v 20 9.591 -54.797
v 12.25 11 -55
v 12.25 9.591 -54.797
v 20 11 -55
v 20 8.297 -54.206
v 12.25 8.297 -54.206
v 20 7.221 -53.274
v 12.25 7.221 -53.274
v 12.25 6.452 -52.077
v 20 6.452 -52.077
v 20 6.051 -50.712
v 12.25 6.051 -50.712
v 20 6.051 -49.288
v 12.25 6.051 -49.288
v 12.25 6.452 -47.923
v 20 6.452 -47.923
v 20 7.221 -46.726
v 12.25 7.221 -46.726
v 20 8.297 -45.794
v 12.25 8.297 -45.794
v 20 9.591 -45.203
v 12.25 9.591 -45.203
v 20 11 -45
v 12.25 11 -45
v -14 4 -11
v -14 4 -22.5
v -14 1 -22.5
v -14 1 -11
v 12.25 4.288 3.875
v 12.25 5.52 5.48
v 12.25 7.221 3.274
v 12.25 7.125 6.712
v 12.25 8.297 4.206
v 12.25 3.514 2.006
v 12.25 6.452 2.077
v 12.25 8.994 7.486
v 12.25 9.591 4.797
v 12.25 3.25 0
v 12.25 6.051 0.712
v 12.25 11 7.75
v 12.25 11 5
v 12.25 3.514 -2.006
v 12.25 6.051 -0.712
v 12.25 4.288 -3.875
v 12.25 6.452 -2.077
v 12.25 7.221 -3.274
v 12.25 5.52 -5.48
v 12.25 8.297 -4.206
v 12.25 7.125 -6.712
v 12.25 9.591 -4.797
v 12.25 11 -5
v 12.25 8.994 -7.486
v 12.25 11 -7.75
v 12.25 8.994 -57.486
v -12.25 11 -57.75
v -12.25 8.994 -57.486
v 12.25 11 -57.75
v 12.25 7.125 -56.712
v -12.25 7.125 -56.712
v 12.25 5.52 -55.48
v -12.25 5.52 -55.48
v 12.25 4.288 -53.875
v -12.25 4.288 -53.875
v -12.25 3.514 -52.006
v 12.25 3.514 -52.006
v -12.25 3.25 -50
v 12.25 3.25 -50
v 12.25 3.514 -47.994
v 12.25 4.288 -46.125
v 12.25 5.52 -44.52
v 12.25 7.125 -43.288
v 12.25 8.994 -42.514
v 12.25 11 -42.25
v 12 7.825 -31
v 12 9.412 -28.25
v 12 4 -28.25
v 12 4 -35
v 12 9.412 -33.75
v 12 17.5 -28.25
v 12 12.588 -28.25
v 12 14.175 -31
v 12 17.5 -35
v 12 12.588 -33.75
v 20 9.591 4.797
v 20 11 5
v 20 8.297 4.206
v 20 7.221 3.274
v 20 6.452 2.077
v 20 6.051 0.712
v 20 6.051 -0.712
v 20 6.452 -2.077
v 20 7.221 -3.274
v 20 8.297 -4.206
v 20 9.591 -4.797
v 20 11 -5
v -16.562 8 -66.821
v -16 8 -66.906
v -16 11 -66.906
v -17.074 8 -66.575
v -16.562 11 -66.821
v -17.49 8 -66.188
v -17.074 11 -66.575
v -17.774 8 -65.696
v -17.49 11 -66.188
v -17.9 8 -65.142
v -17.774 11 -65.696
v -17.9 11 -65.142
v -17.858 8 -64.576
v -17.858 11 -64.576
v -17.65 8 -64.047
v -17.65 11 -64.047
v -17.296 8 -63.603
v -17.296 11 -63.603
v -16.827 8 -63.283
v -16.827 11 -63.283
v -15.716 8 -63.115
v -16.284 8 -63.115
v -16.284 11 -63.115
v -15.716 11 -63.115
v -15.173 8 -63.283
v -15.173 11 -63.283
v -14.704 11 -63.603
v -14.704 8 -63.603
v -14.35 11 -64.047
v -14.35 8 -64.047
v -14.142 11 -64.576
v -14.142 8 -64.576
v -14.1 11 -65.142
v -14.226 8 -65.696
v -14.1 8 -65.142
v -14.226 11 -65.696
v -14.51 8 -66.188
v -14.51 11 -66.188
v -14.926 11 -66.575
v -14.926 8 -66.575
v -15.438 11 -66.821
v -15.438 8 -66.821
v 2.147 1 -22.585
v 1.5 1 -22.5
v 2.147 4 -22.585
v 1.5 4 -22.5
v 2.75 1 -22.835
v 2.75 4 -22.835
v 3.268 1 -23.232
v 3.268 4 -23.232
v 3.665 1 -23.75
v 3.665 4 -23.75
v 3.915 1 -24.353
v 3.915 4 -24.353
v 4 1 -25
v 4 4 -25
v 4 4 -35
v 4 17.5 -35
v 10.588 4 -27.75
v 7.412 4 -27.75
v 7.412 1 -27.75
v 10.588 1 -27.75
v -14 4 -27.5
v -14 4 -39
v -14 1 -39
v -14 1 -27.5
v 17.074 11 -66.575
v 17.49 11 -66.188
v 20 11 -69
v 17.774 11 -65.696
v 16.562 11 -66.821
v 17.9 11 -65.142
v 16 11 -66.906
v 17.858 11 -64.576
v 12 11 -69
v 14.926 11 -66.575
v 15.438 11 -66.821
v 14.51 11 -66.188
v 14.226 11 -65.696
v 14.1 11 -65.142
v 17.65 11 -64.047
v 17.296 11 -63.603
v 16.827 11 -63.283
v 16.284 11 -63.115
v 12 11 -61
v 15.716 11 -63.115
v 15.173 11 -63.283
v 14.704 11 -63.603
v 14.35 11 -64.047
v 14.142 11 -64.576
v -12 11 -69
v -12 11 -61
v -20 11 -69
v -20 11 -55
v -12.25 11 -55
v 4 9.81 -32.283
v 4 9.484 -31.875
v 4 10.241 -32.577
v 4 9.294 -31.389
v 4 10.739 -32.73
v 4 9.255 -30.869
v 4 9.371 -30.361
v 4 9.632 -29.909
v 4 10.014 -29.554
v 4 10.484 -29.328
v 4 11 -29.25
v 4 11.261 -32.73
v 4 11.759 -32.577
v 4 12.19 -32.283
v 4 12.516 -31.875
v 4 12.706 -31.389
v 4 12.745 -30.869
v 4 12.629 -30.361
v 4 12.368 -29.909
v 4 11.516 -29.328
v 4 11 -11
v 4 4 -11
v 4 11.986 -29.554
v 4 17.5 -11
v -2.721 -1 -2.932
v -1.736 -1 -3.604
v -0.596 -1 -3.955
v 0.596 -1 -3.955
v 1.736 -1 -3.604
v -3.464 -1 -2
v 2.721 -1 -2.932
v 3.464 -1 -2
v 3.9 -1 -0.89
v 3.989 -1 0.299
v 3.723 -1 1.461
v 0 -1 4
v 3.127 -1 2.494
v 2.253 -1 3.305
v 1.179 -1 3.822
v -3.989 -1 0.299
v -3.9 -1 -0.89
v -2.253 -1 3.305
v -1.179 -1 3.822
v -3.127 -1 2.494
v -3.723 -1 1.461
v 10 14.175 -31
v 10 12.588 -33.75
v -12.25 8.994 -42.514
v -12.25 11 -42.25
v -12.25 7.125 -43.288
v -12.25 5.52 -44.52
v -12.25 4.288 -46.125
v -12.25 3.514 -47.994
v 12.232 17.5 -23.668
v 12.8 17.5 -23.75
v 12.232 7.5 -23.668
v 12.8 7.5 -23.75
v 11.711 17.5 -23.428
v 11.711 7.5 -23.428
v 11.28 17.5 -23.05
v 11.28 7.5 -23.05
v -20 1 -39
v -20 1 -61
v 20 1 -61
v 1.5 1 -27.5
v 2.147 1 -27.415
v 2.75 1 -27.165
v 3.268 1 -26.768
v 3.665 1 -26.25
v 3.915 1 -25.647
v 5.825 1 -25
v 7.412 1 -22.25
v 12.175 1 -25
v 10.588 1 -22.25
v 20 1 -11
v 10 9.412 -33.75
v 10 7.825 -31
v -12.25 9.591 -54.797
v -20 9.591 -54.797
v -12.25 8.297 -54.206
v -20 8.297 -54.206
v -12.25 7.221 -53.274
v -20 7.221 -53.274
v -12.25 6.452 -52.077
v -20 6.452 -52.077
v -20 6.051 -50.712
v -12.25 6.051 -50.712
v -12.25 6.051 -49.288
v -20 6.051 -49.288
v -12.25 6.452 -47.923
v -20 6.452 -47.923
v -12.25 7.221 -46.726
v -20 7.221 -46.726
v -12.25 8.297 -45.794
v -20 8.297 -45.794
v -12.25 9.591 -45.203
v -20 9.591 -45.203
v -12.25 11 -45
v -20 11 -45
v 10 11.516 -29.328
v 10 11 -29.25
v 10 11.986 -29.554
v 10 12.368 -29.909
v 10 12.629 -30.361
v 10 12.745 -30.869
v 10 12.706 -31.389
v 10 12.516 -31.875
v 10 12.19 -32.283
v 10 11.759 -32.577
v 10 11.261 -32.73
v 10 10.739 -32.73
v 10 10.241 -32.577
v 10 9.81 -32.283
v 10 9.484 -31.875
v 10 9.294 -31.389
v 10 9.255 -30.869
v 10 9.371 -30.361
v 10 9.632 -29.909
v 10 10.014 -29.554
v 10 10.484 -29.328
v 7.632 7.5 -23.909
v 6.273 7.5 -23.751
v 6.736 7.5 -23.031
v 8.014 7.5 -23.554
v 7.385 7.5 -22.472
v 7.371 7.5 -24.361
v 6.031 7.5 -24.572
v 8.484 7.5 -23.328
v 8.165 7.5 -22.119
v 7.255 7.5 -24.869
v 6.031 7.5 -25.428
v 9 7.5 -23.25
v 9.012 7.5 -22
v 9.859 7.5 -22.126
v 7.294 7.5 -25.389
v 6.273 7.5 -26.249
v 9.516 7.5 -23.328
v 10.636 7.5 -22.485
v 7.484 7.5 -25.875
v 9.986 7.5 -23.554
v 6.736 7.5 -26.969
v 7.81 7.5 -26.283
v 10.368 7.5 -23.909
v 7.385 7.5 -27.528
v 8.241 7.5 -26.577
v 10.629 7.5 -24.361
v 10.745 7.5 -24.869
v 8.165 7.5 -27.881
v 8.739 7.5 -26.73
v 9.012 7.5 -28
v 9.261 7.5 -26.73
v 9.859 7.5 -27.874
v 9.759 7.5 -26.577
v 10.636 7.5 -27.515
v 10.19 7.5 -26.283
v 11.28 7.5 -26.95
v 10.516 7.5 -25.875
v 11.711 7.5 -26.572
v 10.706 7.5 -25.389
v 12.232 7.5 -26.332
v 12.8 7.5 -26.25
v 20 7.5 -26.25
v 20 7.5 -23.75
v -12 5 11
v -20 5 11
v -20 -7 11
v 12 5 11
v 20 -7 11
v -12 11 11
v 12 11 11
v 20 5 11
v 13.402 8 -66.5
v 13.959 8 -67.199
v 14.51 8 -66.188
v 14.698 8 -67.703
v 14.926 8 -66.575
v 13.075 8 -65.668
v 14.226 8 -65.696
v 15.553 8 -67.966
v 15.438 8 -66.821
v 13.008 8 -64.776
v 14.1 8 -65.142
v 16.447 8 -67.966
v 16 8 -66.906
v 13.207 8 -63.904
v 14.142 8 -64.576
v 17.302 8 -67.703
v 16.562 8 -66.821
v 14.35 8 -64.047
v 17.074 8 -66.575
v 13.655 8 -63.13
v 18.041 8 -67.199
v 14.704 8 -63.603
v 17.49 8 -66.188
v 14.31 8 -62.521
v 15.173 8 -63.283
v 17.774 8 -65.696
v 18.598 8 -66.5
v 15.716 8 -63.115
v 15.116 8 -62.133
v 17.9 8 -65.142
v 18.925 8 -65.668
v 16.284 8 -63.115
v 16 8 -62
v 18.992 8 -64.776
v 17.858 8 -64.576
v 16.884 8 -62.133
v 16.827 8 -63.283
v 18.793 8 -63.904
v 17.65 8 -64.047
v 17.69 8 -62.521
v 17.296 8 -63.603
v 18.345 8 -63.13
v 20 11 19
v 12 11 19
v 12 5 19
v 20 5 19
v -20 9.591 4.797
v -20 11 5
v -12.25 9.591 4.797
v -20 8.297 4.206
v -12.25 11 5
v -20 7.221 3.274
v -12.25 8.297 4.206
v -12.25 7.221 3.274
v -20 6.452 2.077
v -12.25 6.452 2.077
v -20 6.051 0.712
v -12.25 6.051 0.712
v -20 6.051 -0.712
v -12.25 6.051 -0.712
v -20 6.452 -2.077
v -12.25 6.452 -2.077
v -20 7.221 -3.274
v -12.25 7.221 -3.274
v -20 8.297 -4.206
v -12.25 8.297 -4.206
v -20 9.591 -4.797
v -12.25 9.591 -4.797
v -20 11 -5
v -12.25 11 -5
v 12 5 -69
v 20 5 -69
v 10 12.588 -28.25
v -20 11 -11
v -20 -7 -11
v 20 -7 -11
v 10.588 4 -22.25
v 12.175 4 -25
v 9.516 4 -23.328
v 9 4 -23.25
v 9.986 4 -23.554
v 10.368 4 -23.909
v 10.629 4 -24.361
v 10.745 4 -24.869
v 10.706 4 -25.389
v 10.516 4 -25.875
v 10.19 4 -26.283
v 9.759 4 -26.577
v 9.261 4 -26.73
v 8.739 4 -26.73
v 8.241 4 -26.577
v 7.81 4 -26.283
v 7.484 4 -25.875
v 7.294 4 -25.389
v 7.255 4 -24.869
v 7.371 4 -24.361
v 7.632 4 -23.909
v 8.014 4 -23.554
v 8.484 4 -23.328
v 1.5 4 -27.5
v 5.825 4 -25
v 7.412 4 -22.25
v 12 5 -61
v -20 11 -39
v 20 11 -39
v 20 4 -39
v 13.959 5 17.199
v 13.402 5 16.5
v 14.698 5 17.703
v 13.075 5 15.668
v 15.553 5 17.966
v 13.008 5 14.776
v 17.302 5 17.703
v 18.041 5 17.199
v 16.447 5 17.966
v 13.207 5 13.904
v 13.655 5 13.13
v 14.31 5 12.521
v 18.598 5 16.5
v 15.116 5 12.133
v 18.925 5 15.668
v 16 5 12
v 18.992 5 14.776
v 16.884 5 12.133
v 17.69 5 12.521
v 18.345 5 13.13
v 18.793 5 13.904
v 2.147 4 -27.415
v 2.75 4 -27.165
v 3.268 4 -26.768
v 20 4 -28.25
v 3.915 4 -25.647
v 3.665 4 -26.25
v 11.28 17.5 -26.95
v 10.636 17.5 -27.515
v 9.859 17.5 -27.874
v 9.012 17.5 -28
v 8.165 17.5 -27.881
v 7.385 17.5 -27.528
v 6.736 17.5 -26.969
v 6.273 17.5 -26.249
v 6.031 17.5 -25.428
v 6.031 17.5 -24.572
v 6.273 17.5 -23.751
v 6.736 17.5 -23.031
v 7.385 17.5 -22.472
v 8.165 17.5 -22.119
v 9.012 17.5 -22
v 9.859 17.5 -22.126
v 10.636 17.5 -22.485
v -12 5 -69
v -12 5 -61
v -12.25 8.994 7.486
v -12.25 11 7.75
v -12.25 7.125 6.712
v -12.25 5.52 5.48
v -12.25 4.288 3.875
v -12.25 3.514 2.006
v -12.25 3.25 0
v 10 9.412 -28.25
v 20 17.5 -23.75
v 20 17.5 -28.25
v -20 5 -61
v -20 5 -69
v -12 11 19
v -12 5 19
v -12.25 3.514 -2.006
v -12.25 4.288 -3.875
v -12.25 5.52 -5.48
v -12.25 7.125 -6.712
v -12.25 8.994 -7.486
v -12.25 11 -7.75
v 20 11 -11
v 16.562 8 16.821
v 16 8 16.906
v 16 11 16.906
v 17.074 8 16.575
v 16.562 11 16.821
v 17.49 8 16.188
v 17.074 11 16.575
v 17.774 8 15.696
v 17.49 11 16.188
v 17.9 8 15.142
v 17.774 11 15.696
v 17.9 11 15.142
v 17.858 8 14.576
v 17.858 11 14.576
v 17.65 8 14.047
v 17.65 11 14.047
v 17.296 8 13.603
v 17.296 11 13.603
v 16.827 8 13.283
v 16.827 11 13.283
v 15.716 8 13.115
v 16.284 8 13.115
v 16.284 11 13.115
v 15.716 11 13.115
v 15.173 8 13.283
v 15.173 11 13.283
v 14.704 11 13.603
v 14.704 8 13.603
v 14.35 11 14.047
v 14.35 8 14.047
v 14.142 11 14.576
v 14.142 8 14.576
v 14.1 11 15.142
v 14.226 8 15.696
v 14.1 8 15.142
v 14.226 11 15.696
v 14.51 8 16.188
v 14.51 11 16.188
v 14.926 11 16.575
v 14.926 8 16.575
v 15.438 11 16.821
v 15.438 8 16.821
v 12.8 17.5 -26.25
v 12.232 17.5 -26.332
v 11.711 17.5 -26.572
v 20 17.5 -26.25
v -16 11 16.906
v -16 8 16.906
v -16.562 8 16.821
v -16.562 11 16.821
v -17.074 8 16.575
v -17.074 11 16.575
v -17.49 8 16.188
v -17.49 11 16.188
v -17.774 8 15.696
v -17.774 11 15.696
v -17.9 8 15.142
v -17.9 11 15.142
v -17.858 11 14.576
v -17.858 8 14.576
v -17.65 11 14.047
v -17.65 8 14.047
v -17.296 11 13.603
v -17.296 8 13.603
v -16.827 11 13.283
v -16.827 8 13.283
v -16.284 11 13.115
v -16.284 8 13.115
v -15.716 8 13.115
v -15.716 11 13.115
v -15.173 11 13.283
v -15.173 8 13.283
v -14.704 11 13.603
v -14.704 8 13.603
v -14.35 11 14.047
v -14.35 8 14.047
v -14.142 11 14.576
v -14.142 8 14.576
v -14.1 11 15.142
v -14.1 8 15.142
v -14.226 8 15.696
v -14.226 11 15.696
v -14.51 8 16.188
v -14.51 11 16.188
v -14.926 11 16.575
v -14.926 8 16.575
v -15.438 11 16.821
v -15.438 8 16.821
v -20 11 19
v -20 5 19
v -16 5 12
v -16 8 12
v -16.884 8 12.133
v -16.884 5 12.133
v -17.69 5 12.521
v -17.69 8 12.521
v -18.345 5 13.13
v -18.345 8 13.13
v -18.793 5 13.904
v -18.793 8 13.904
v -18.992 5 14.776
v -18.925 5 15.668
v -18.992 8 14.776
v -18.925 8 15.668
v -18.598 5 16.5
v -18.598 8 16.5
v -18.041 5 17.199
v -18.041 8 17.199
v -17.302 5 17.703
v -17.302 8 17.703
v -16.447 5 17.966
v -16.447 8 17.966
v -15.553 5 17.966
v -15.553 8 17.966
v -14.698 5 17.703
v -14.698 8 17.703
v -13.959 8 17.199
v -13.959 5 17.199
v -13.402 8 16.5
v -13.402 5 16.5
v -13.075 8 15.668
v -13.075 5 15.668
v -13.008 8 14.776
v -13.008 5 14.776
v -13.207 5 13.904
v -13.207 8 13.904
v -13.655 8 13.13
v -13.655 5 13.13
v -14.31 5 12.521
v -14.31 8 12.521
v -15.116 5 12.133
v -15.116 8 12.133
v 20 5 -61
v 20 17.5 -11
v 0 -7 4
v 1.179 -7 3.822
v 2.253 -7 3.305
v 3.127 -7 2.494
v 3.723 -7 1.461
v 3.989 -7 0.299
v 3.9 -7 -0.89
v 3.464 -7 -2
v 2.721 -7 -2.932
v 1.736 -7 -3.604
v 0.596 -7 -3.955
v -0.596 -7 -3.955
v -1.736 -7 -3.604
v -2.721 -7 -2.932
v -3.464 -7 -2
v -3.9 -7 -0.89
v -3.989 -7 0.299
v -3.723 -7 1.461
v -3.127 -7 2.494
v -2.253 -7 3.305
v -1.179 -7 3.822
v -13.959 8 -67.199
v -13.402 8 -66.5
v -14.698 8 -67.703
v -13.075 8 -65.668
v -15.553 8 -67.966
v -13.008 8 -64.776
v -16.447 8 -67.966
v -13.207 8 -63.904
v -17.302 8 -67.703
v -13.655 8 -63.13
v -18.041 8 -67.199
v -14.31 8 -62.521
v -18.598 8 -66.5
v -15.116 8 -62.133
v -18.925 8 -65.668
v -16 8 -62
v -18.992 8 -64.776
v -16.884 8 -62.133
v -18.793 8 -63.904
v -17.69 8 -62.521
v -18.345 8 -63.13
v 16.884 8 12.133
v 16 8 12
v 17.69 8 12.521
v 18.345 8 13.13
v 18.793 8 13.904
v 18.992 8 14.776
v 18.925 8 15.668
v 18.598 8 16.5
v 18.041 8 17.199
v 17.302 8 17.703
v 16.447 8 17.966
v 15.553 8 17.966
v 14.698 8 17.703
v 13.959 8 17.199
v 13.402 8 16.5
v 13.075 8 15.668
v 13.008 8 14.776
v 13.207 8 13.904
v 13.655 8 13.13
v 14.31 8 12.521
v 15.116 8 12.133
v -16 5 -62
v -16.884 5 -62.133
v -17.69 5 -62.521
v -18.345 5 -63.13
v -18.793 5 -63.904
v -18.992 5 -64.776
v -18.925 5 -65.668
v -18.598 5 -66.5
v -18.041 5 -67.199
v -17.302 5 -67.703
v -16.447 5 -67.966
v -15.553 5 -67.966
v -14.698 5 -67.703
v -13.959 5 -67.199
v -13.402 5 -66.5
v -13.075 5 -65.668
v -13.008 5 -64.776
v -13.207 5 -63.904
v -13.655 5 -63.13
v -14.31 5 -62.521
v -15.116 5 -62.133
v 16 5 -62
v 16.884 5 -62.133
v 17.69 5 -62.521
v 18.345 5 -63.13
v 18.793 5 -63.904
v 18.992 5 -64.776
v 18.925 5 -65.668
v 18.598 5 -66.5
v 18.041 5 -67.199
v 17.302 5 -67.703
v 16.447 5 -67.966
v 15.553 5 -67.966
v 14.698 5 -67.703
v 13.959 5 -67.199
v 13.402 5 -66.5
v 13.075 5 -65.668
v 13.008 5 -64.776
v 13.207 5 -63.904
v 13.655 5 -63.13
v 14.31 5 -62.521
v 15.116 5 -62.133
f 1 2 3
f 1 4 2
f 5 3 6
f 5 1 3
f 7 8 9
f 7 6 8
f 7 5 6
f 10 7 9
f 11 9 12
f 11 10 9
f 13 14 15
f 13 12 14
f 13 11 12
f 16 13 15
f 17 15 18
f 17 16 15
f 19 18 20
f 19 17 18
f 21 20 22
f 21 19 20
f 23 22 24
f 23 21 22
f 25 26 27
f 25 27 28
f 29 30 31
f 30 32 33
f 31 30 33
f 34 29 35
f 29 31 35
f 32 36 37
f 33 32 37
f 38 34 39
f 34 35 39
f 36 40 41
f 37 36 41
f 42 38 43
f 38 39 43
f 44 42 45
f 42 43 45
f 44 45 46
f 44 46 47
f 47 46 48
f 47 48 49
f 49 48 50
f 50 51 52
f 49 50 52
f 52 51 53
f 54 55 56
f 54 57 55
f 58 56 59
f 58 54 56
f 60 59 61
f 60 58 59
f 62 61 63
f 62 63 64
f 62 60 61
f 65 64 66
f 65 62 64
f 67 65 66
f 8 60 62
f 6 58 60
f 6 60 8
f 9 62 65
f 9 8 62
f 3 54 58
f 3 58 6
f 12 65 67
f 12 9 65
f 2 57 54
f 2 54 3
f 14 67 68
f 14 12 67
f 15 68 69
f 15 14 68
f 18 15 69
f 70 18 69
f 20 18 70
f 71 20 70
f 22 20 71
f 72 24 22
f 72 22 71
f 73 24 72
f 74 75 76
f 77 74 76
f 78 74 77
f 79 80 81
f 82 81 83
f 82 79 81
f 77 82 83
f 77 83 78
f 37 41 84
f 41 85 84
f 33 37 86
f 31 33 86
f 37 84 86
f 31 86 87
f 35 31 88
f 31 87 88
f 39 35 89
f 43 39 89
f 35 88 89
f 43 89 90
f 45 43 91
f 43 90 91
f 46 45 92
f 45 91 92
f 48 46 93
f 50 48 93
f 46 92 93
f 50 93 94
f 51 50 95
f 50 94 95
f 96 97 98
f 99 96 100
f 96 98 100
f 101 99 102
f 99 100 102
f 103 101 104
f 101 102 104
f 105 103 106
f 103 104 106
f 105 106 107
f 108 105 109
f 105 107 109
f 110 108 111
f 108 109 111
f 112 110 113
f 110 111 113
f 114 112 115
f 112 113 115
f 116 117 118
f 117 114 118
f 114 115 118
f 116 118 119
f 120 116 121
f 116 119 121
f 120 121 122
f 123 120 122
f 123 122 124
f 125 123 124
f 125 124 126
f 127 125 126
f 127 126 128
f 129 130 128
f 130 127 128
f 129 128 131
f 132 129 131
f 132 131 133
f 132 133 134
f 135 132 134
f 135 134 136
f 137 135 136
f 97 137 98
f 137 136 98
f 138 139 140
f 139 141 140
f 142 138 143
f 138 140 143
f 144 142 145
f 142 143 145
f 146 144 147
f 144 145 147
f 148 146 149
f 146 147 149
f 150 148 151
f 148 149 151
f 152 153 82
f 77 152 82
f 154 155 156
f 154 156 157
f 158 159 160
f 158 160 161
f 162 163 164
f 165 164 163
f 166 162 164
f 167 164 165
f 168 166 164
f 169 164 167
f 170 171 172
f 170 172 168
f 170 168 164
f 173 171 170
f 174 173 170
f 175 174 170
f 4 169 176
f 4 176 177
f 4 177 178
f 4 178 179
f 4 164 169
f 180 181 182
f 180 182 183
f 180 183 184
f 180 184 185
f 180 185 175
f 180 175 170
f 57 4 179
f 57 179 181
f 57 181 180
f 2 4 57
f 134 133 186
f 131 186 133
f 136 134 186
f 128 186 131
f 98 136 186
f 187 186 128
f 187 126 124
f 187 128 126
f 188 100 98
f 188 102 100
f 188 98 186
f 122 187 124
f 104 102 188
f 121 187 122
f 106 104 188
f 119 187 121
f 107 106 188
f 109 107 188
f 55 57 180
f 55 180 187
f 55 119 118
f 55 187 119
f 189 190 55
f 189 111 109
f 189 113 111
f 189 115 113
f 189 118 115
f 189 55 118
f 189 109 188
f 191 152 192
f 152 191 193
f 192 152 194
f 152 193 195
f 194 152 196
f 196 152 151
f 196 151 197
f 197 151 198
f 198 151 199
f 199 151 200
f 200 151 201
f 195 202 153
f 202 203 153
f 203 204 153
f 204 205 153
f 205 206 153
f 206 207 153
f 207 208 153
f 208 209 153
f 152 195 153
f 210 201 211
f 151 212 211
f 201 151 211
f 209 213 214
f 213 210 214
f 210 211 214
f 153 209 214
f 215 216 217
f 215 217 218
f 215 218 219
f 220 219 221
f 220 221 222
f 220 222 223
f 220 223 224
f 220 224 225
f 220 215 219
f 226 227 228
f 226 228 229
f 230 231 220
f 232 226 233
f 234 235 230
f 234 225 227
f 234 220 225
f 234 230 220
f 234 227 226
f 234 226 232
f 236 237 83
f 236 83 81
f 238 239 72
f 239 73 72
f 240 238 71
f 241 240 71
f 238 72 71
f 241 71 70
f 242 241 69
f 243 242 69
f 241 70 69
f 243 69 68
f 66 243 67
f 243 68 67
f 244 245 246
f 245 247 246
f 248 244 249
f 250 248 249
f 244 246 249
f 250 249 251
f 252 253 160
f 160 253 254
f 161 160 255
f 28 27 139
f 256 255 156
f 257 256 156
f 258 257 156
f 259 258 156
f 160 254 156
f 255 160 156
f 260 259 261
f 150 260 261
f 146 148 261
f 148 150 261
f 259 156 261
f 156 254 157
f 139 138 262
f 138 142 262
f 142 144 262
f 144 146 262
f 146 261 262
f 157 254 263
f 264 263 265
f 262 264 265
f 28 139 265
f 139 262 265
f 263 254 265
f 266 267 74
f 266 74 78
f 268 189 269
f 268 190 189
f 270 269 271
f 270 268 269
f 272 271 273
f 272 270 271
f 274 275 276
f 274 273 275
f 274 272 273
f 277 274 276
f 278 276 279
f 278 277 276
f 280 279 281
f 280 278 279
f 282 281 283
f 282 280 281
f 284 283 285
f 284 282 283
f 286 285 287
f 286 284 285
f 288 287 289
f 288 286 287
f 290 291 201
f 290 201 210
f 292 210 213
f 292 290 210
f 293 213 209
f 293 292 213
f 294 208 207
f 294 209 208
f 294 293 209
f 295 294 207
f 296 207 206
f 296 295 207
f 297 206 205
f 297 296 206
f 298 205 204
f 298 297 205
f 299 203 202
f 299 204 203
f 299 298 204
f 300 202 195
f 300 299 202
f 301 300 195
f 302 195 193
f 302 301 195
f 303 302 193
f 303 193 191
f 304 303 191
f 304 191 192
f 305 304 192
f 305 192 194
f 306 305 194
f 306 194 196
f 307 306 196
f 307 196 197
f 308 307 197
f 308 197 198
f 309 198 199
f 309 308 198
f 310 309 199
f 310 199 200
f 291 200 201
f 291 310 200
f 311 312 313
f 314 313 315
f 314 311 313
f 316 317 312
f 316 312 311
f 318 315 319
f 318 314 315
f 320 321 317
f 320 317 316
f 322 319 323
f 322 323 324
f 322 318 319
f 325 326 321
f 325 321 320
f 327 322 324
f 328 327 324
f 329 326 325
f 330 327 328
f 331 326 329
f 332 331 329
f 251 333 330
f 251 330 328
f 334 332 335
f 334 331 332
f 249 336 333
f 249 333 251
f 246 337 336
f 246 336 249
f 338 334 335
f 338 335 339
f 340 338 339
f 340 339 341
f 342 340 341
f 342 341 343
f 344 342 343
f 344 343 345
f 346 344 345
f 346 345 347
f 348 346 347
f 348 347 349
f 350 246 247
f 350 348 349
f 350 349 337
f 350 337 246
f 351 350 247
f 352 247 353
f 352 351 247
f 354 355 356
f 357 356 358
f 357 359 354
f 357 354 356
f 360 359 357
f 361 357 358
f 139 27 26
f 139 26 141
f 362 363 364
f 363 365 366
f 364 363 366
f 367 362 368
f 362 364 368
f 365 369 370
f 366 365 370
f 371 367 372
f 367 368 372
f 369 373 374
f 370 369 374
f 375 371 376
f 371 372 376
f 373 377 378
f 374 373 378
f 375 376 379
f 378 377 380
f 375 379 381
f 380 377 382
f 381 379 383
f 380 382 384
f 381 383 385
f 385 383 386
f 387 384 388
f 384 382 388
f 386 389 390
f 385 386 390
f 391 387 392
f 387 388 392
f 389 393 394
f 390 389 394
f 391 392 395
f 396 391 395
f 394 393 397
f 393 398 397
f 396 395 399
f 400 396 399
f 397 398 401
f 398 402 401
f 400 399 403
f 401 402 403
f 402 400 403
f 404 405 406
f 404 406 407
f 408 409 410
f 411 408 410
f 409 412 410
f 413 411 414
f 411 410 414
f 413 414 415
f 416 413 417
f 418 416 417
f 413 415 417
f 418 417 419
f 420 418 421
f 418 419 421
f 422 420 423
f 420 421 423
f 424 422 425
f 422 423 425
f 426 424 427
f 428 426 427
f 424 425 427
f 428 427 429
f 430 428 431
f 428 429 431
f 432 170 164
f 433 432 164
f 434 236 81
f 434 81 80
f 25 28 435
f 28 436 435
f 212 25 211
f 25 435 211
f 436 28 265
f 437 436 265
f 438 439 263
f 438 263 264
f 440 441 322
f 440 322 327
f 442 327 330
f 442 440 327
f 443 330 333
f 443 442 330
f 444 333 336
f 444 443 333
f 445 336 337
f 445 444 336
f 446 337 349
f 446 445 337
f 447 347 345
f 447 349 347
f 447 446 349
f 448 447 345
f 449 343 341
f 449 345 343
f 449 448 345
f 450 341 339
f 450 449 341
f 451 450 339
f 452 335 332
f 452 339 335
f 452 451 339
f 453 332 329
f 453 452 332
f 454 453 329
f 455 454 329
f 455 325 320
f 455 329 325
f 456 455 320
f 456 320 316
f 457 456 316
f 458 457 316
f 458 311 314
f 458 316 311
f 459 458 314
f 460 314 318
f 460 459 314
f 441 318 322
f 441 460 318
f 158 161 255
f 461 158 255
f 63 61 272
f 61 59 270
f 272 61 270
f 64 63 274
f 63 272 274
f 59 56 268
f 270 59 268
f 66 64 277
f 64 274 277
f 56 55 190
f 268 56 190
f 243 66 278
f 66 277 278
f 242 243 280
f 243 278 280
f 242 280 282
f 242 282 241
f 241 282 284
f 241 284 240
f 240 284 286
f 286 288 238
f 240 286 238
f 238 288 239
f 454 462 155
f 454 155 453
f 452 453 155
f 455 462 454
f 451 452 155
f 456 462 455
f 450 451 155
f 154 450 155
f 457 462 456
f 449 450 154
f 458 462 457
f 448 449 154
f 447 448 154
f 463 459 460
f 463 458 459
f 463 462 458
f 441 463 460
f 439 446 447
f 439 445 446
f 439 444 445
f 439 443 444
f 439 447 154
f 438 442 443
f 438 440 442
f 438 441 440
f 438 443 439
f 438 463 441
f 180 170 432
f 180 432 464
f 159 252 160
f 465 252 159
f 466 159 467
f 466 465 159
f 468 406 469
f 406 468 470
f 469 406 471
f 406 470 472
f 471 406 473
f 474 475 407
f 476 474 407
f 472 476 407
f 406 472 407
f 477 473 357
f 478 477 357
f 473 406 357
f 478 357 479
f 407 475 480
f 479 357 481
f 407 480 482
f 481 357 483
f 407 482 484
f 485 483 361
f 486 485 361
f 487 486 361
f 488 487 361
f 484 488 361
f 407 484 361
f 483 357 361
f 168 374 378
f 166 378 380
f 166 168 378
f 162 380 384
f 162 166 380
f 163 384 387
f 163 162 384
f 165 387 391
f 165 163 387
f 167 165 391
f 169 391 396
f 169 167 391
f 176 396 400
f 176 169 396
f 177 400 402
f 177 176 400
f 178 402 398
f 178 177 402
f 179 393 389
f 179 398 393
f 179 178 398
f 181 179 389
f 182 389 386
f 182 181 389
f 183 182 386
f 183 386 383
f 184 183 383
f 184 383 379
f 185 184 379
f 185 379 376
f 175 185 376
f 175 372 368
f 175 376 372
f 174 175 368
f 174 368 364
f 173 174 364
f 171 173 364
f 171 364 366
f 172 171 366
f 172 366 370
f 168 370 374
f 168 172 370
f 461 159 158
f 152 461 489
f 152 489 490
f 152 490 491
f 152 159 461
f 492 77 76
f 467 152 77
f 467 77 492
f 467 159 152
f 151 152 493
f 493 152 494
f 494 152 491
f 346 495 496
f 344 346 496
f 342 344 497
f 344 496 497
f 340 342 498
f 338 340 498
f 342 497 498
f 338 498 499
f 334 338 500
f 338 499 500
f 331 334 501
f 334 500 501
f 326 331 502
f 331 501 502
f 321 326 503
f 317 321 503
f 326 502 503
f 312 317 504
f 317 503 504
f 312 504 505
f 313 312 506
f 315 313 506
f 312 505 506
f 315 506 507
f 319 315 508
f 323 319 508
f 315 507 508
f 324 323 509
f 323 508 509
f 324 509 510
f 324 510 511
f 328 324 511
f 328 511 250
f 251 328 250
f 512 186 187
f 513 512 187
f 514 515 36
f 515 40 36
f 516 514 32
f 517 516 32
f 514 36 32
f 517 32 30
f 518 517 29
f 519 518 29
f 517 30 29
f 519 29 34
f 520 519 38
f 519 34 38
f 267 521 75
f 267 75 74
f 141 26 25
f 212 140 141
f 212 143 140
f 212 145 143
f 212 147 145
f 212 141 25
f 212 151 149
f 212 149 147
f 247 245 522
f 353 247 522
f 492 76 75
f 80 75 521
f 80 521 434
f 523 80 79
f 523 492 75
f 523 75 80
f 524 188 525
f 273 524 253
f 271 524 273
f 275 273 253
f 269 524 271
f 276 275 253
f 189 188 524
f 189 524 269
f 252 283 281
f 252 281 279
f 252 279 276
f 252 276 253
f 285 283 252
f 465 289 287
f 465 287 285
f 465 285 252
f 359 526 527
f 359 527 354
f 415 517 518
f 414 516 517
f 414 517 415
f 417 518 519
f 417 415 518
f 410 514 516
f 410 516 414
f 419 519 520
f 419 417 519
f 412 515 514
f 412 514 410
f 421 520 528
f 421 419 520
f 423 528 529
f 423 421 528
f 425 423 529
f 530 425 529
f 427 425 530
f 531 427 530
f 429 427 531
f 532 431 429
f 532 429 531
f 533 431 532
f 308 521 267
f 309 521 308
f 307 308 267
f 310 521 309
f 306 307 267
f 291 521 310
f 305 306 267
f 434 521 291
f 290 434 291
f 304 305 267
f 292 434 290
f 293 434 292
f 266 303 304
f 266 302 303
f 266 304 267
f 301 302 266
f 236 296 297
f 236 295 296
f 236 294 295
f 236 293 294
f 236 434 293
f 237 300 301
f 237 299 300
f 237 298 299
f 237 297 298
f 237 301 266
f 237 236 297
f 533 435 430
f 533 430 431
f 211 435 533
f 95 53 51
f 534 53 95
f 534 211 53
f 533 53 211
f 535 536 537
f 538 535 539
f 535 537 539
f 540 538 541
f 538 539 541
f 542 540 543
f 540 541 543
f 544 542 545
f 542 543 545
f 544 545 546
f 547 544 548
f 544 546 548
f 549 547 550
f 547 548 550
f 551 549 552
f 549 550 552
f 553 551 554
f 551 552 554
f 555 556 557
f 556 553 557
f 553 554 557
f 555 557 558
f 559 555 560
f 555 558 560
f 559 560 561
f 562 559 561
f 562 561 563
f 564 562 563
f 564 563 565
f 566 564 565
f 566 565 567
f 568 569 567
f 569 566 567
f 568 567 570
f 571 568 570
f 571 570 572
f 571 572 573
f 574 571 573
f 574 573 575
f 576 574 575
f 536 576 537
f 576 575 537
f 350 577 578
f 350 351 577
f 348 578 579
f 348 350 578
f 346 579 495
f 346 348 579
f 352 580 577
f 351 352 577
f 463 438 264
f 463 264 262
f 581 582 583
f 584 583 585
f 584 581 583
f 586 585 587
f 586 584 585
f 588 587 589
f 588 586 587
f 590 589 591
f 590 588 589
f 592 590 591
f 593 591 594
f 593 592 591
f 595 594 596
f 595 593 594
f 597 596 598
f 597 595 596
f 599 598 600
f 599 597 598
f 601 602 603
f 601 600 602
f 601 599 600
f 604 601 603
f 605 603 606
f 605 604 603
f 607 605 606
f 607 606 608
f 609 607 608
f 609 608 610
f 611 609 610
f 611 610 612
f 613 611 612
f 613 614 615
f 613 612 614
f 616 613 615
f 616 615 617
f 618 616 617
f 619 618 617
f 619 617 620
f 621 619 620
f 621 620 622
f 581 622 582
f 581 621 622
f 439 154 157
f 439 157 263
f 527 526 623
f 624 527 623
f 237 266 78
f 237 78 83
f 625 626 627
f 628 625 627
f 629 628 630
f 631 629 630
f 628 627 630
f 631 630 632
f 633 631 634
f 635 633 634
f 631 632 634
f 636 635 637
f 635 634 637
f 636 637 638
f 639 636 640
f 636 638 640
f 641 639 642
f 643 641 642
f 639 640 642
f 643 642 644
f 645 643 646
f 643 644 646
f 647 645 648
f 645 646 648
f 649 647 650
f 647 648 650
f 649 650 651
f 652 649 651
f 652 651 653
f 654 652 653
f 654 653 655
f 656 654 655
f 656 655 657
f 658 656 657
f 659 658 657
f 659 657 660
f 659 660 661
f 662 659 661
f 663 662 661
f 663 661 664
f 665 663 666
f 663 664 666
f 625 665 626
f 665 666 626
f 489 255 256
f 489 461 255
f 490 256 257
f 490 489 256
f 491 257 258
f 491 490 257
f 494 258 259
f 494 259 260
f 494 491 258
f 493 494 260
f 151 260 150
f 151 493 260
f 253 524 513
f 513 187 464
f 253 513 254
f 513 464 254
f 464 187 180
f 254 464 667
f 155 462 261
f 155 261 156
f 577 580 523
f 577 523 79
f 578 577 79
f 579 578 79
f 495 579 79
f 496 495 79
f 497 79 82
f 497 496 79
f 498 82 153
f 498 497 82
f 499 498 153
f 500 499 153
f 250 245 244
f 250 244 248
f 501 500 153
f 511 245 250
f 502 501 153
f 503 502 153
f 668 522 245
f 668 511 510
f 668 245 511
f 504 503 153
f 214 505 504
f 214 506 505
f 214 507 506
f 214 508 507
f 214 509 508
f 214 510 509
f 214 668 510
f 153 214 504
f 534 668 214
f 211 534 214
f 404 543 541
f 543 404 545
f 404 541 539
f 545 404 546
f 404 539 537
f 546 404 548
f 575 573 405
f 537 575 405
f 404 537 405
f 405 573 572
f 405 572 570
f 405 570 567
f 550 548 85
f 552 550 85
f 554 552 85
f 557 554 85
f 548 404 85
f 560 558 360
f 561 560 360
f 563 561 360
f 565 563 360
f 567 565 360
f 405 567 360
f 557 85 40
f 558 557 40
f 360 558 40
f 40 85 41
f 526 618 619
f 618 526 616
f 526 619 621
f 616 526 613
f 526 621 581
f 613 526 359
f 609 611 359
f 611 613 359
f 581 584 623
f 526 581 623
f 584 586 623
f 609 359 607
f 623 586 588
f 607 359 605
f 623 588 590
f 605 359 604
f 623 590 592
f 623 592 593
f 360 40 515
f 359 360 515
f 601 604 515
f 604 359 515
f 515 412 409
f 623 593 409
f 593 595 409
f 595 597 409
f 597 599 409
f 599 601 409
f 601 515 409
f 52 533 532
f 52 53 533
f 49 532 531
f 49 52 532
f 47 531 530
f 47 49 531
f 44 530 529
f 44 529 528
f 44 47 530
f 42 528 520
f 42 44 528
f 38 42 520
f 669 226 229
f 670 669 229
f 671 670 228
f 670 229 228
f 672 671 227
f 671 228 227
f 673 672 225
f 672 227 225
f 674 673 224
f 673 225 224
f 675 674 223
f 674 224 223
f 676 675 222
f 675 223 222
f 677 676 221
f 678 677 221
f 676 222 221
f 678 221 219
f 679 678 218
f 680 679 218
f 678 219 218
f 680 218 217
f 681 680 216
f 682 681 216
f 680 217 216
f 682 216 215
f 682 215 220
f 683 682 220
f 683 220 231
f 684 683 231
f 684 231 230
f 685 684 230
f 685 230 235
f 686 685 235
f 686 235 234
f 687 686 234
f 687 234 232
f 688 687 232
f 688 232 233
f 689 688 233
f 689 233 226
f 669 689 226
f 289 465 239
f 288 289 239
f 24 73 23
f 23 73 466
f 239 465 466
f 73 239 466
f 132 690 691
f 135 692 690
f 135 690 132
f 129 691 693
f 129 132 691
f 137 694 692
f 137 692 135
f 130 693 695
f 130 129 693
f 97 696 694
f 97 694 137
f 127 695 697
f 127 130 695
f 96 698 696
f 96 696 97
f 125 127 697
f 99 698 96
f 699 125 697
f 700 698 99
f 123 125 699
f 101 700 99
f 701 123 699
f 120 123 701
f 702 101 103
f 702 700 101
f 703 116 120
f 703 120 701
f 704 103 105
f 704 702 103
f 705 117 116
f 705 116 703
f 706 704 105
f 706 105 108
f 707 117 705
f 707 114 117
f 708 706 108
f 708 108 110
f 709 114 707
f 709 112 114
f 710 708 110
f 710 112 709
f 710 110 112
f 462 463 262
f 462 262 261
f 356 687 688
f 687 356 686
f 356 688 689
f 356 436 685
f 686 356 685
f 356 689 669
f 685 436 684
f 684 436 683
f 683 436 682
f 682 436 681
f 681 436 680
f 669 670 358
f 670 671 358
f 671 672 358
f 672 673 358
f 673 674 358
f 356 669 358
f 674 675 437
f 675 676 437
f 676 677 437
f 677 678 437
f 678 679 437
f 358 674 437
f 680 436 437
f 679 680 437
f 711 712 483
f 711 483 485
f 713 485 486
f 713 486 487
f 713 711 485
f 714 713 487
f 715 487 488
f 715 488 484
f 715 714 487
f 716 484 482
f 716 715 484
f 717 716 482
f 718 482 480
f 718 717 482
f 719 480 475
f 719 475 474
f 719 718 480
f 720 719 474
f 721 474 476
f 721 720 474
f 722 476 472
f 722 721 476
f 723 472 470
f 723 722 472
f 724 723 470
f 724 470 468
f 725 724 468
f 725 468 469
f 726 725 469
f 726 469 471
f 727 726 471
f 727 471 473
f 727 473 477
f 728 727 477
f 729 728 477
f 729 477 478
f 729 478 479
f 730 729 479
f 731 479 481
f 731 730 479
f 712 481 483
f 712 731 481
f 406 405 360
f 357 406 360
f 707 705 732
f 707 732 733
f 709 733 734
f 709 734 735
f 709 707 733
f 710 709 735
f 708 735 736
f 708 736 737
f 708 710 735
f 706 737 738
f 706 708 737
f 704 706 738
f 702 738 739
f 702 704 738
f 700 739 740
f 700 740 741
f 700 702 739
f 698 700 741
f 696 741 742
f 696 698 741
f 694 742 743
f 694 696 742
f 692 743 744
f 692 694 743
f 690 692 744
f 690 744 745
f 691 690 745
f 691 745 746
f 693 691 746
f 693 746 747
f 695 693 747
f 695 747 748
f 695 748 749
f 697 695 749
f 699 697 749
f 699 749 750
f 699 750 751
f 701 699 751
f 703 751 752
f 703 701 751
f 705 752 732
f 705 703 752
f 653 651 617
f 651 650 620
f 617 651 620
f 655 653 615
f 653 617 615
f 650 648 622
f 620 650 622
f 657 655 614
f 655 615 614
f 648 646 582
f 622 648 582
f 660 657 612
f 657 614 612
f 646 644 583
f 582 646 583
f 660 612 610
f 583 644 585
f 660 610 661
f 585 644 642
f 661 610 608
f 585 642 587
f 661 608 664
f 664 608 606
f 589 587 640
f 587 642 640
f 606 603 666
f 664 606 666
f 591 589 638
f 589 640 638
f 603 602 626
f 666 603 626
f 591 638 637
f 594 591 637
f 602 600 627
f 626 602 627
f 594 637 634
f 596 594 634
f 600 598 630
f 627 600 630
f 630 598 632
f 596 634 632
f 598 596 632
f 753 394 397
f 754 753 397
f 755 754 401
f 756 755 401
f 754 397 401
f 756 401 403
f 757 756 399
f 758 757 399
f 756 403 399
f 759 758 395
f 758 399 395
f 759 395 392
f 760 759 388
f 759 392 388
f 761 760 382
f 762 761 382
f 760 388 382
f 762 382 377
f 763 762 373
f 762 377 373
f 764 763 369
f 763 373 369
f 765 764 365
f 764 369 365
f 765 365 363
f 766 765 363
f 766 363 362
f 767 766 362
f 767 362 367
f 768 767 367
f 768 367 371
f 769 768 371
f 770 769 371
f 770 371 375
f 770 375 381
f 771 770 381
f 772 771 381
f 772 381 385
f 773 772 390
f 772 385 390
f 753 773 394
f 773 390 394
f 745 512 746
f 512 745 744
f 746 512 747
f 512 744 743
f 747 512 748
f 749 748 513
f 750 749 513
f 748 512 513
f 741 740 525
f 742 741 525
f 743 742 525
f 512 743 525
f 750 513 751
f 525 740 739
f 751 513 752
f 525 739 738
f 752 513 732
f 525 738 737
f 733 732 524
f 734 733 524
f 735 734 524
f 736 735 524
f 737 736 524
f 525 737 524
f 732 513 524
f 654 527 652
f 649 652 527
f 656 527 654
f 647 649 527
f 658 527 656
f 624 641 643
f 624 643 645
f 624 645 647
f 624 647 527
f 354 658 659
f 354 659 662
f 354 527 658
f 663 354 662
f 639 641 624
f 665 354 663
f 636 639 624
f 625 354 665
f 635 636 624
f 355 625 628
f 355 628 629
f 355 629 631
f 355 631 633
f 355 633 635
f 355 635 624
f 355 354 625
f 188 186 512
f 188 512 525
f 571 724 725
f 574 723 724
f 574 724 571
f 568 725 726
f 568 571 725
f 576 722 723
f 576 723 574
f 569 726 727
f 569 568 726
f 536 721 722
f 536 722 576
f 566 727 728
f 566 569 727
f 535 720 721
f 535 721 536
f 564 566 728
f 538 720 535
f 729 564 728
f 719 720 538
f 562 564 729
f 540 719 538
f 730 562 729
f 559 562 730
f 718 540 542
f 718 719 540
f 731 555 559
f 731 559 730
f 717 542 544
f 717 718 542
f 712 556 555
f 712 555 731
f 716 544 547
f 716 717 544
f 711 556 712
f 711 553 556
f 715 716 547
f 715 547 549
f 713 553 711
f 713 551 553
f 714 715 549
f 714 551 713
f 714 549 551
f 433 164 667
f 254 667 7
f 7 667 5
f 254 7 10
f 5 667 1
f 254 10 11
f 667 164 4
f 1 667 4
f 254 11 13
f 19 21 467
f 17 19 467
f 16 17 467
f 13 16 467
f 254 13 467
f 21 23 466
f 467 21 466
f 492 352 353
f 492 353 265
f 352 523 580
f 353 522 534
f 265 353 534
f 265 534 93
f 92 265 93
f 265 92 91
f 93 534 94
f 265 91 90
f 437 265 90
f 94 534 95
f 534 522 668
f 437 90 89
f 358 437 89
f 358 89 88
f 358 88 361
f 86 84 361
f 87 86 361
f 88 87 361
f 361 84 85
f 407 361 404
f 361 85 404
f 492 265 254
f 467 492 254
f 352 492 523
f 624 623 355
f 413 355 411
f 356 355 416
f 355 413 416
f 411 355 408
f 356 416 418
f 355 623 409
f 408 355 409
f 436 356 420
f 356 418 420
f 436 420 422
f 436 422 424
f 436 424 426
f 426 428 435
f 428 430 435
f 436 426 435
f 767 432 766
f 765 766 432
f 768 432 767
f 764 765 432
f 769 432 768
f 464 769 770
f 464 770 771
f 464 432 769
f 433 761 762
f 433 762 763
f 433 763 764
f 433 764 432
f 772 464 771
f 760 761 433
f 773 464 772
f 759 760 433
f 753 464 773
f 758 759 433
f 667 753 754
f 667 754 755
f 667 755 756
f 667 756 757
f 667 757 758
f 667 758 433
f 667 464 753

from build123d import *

# Parameters (mm, degrees)
SKETCH1_W                  = 40
SKETCH1_H                  = 22
BOSS_EXTRUDE1_DEPTH        = 11
SKETCH2_W                  = 40
SKETCH2_H                  = 22
SKETCH2_R                  = 4
BOSS_EXTRUDE2_DEPTH        = 7
SKETCH3_W                  = 24.5
SKETCH3_H                  = 15.5
CUT_EXTRUDE1_DEPTH         = 7.75
FILLET1_R                  = 7.75
SKETCH4_R                  = 5
CUT_EXTRUDE2_DEPTH         = 36.805900352
SKETCH5_W                  = 8
SKETCH5_H                  = 8
SKETCH5_R                  = 1.905800151
BOSS_EXTRUDE3_DEPTH        = 6
CUT_EXTRUDE3_START         = -3
SKETCH6_R                  = 3
SKETCH6_R_2                = 1.905800151
CUT_EXTRUDE3_DEPTH         = 3
SKETCH7_W                  = 16
SKETCH7_H                  = 16.5
BOSS_EXTRUDE5_DEPTH        = 28
MIRROR14_COPY_1_SKETCH_W   = 8
MIRROR14_COPY_1_SKETCH_H   = 8
MIRROR14_COPY_1_SKETCH_R   = 1.905800151
MIRROR14_COPY_1_DEPTH      = 6
MIRROR14_START             = -3
MIRROR14_COPY_2_SKETCH_R   = 3
MIRROR14_COPY_2_SKETCH_R_2 = 1.905800151
MIRROR14_COPY_2_DEPTH      = 3
FILLET1_OF_MIRROR14_R      = 7.75
SKETCH9_W                  = 28
SKETCH9_H                  = 3
BOSS_EXTRUDE6_DEPTH        = 18
CUT_EXTRUDE4_DEPTH         = 10
CUT_EXTRUDE5_DEPTH         = 74.288812243
CUT_EXTRUDE5_DEPTH_BACK    = 74.288812243
SKETCH11_R                 = 1.75
CUT_EXTRUDE6_DEPTH         = 76.121568141
CUT_EXTRUDE6_DEPTH_BACK    = 76.121568141
SKETCH12_R                 = 1.75
FILLET2_R                  = 2
CUT_EXTRUDE12_START        = -3
SKETCH17_R                 = 1.75
CUT_EXTRUDE12_DEPTH        = 3
CUT_EXTRUDE13_DEPTH        = 74.097537578
CUT_EXTRUDE13_DEPTH_BACK   = 74.097537578
SKETCH18_W                 = 18
SKETCH18_H                 = 5
FILLET3_R                  = 2.5
CUT_EXTRUDE14_DEPTH        = 74.710582687
CUT_EXTRUDE15_START        = -10
SKETCH21_R                 = 1.75
CUT_EXTRUDE15_DEPTH        = 10
SKETCH20_W                 = 36.163748027
SKETCH20_H                 = 4
CUT_EXTRUDE16_DEPTH        = 13.5
SKETCH22_W                 = 6.75
SKETCH22_H                 = 13.5
CUT_EXTRUDE18_DEPTH        = 8
SKETCH23_R                 = 4
BOSS_EXTRUDE8_DEPTH        = 1


with BuildPart() as part:
    # Sketch1 → Boss-Extrude1 (new body)
    with BuildSketch(Plane(origin=(0, 0, 0), x_dir=(1, 0, 0), z_dir=(0, 1, 0))):
        Rectangle(SKETCH1_W, SKETCH1_H)
    boss_extrude1 = extrude(amount=BOSS_EXTRUDE1_DEPTH)

    # Sketch2 → Boss-Extrude2 (add)
    with BuildSketch(Plane(origin=(0, 0, 0), x_dir=(1, 0, 0), z_dir=(0, 1, 0))):
        Rectangle(SKETCH2_W, SKETCH2_H)
        with Locations(Location((0, 0, 0), (0, 0, 270))):
            Circle(SKETCH2_R, mode=Mode.SUBTRACT)
    boss_extrude2 = extrude(amount=-BOSS_EXTRUDE2_DEPTH)

    # Sketch3 → Cut-Extrude1 (cut)
    with BuildSketch(Plane(origin=(0, 11, 0), x_dir=(1, 0, 0), z_dir=(0, 1, 0))):
        Rectangle(SKETCH3_W, SKETCH3_H)
    cut_extrude1 = extrude(amount=-CUT_EXTRUDE1_DEPTH, mode=Mode.SUBTRACT)

    # Fillet1
    fillet1_edges = [part.edges().sort_by_distance(p)[0] for p in [
        (0, 3.25, 7.75),
        (0, 3.25, -7.75),
    ]]
    fillet(fillet1_edges, radius=FILLET1_R - 0.0001)  # a hair under: the kernel refuses the full size

    # Sketch4 → Cut-Extrude2 (cut, symmetric)
    with BuildSketch(Plane(origin=(-12.25, 0, 0), x_dir=(0, 0, -1), z_dir=(1, 0, 0))):
        with Locations((0, 11)):
            Circle(SKETCH4_R)
    cut_extrude2 = extrude(amount=CUT_EXTRUDE2_DEPTH, both=True, mode=Mode.SUBTRACT)

    # Sketch5 → Boss-Extrude3 (add)
    with BuildSketch(Plane(origin=(0, 11, 0), x_dir=(1, 0, 0), z_dir=(0, 1, 0))):
        with Locations((16, -15)):
            Rectangle(SKETCH5_W, SKETCH5_H)
        with Locations(Location((16, -15, 0), (0, 0, 270))):
            Circle(SKETCH5_R, mode=Mode.SUBTRACT)
    boss_extrude3 = extrude(amount=-BOSS_EXTRUDE3_DEPTH)

    # Sketch6 → Cut-Extrude3 (cut)
    with BuildSketch(Plane.XZ.offset(-5).offset(CUT_EXTRUDE3_START)):
        with Locations(Location((16, 15, 0), (0, 0, 270))):
            Circle(SKETCH6_R)
        with Locations(Location((16, 15, 0), (0, 0, 90))):
            Circle(SKETCH6_R_2, mode=Mode.SUBTRACT)
    cut_extrude3 = extrude(amount=CUT_EXTRUDE3_DEPTH, mode=Mode.SUBTRACT)

    # Mirror8: Boss-Extrude3, Cut-Extrude3 across plane
    add(boss_extrude3.mirror(Plane(origin=(0, 0, 0), x_dir=(0, 0, 1), z_dir=(1, 0, 0))))
    add(cut_extrude3.mirror(Plane(origin=(0, 0, 0), x_dir=(0, 0, 1), z_dir=(1, 0, 0))), mode=Mode.SUBTRACT)

    # Sketch7 → Boss-Extrude5 (add)
    with BuildSketch(Plane(origin=(0, 0, -11), x_dir=(-1, 0, 0), z_dir=(0, 0, -1))):
        with Locations((-12, 9.25)):
            Rectangle(SKETCH7_W, SKETCH7_H)
    extrude(amount=BOSS_EXTRUDE5_DEPTH)

    # Mirror14: Boss-Extrude1, Boss-Extrude2, Cut-Extrude1, Cut-Extrude2, Boss-Extrude3, Cut-Extrude3 across plane
    add(boss_extrude1.mirror(Plane.XY.offset(-25)))
    add(boss_extrude2.mirror(Plane.XY.offset(-25)))
    add(cut_extrude1.mirror(Plane.XY.offset(-25)), mode=Mode.SUBTRACT)
    add(cut_extrude2.mirror(Plane.XY.offset(-25)), mode=Mode.SUBTRACT)
    add(boss_extrude3.mirror(Plane.XY.offset(-25)))
    add(cut_extrude3.mirror(Plane.XY.offset(-25)), mode=Mode.SUBTRACT)

    # Mirror14 copy 1 sketch → Mirror14 copy 1 (add)
    with BuildSketch(Plane(origin=(0, 11, -50), x_dir=(-1, 0, 0), z_dir=(0, 1, 0))):
        with Locations((16, -15)):
            Rectangle(MIRROR14_COPY_1_SKETCH_W, MIRROR14_COPY_1_SKETCH_H)
        with Locations(Location((16, -15, 0), (0, 0, 270))):
            Circle(MIRROR14_COPY_1_SKETCH_R, mode=Mode.SUBTRACT)
    extrude(amount=-MIRROR14_COPY_1_DEPTH)

    # Mirror14 copy 2 sketch → Mirror14 copy 2 (cut)
    with BuildSketch(Plane(origin=(0, 5, -50), x_dir=(-1, 0, 0), z_dir=(0, -1, 0)).offset(MIRROR14_START)):
        with Locations(Location((16, 15, 0), (0, 0, 270))):
            Circle(MIRROR14_COPY_2_SKETCH_R)
        with Locations(Location((16, 15, 0), (0, 0, 90))):
            Circle(MIRROR14_COPY_2_SKETCH_R_2, mode=Mode.SUBTRACT)
    extrude(amount=MIRROR14_COPY_2_DEPTH, mode=Mode.SUBTRACT)

    # Fillet1 of Mirror14
    fillet1_of_mirror14_edges = [part.edges().sort_by_distance(p)[0] for p in [
        (0, 3.25, -57.75),
        (0, 3.25, -42.25),
    ]]
    fillet(fillet1_of_mirror14_edges, radius=FILLET1_OF_MIRROR14_R - 0.0001)  # a hair under: the kernel refuses the full size

    # Sketch9 → Boss-Extrude6 (add)
    with BuildSketch(Plane.ZY.offset(-4)):
        with Locations((-25, 2.5)):
            Rectangle(SKETCH9_W, SKETCH9_H)
    extrude(amount=BOSS_EXTRUDE6_DEPTH)

    # Sketch10 → Cut-Extrude4 (cut)
    with BuildSketch(Plane(origin=(0, 17.5, 0), x_dir=(1, 0, 0), z_dir=(0, 1, 0))):
        with BuildLine():
            Line((9, 26.25), (9, 23.75))
            Line((9, 23.75), (11.727178029, 23.75))
            ThreePointArc((11.727178029, 23.75), (11.931001031, 24.360286817), (12, 25))
            ThreePointArc((12, 25), (11.931001031, 25.639713183), (11.727178029, 26.25))
            Line((11.727178029, 26.25), (9, 26.25))
        make_face()
        with BuildLine():
            Line((11.727178029, 23.75), (9, 23.75))
            Line((9, 23.75), (9, 26.25))
            Line((9, 26.25), (11.727178029, 26.25))
            ThreePointArc((11.727178029, 26.25), (6, 25), (11.727178029, 23.75))
        make_face()
        with BuildLine():
            ThreePointArc((12, 25), (11.931001031, 24.360286817), (11.727178029, 23.75))
            Line((11.727178029, 23.75), (20, 23.75))
            Line((20, 23.75), (20, 26.25))
            Line((20, 26.25), (11.727178029, 26.25))
            ThreePointArc((11.727178029, 26.25), (11.931001031, 25.639713183), (12, 25))
        make_face()
    extrude(amount=-CUT_EXTRUDE4_DEPTH, mode=Mode.SUBTRACT)

    # Sketch11 → Cut-Extrude5 (cut, two sides: drawn at the far end of the back side and taken through both)
    with BuildSketch(Plane(origin=(0, 7.5, 0), x_dir=(1, 0, 0), z_dir=(0, 1, 0)).offset(-CUT_EXTRUDE5_DEPTH_BACK)):
        with Locations(Location((9, 25, 0), (0, 0, 270))):
            Circle(SKETCH11_R)
    extrude(amount=CUT_EXTRUDE5_DEPTH + CUT_EXTRUDE5_DEPTH_BACK, mode=Mode.SUBTRACT)

    # Sketch12 → Cut-Extrude6 (cut, two sides: drawn at the far end of the back side and taken through both)
    with BuildSketch(Plane.ZY.offset(-4).offset(-CUT_EXTRUDE6_DEPTH_BACK)):
        with Locations((-31, 11)):
            Circle(SKETCH12_R)
    extrude(amount=CUT_EXTRUDE6_DEPTH + CUT_EXTRUDE6_DEPTH_BACK, mode=Mode.SUBTRACT)

    # Fillet2
    fillet2_edges = [part.edges().sort_by_distance(p)[0] for p in [
        (11.727178029, 12.5, -23.75),
        (11.727178029, 12.5, -26.25),
    ]]
    fillet(fillet2_edges, radius=FILLET2_R)

    # Sketch17 → Cut-Extrude12 (cut)
    with BuildSketch(Plane.XZ.offset(-1).offset(CUT_EXTRUDE12_START)):
        Polygon((12.175426481, -25), (10.58771324, -22.25), (7.41228676, -22.25), (5.824573519, -25), (7.41228676, -27.75), (10.58771324, -27.75), align=None)
        with Locations(Location((9, -25, 0), (0, 0, 90))):
            Circle(SKETCH17_R, mode=Mode.SUBTRACT)
    extrude(amount=CUT_EXTRUDE12_DEPTH, mode=Mode.SUBTRACT)

    # Sketch18 → Cut-Extrude13 (cut, two sides: drawn at the far end of the back side and taken through both)
    with BuildSketch(Plane(origin=(0, 4, 0), x_dir=(1, 0, 0), z_dir=(0, 1, 0)).offset(-CUT_EXTRUDE13_DEPTH_BACK)):
        with Locations((-5, 25)):
            Rectangle(SKETCH18_W, SKETCH18_H)
    extrude(amount=CUT_EXTRUDE13_DEPTH + CUT_EXTRUDE13_DEPTH_BACK, mode=Mode.SUBTRACT)

    # Fillet3
    fillet3_edges = [part.edges().sort_by_distance(p)[0] for p in [
        (4, 2.5, -27.5),
        (4, 2.5, -22.5),
    ]]
    fillet(fillet3_edges, radius=FILLET3_R - 0.0001)  # a hair under: the kernel refuses the full size

    # Sketch19 → Cut-Extrude14 (cut, through all)
    with BuildSketch(Plane.XZ.offset(-1)):
        Polygon((20, -61), (20, -39), (-14, -39), (-20, -39), (-20, -61), align=None)
    extrude(amount=CUT_EXTRUDE14_DEPTH, mode=Mode.SUBTRACT)

    # Sketch21 → Cut-Extrude15 (cut)
    with BuildSketch(Plane(origin=(20, 0, 0), x_dir=(0, 0, -1), z_dir=(1, 0, 0)).offset(CUT_EXTRUDE15_START)):
        Polygon((31, 14.175426481), (28.25, 12.58771324), (28.25, 9.41228676), (31, 7.824573519), (33.75, 9.41228676), (33.75, 12.58771324), align=None)
        with Locations((31, 11)):
            Circle(SKETCH21_R, mode=Mode.SUBTRACT)
    extrude(amount=CUT_EXTRUDE15_DEPTH, mode=Mode.SUBTRACT)

    # Sketch20 → Cut-Extrude16 (cut)
    with BuildSketch(Plane(origin=(0, 17.5, 0), x_dir=(1, 0, 0), z_dir=(0, 1, 0))):
        with Locations((22.081874014, 37)):
            Rectangle(SKETCH20_W, SKETCH20_H)
    extrude(amount=-CUT_EXTRUDE16_DEPTH, mode=Mode.SUBTRACT)

    # Sketch22 → Cut-Extrude18 (cut)
    with BuildSketch(Plane(origin=(20, 0, 0), x_dir=(0, 0, -1), z_dir=(1, 0, 0))):
        with Locations((31.625, 10.75)):
            Rectangle(SKETCH22_W, SKETCH22_H)
    extrude(amount=-CUT_EXTRUDE18_DEPTH, mode=Mode.SUBTRACT)

    # Sketch23 → Boss-Extrude8 (add)
    with BuildSketch(Plane.XZ):
        with Locations(Location((0, 0, 0), (0, 0, 90))):
            Circle(SKETCH23_R)
    extrude(amount=BOSS_EXTRUDE8_DEPTH)


solid = part.part
